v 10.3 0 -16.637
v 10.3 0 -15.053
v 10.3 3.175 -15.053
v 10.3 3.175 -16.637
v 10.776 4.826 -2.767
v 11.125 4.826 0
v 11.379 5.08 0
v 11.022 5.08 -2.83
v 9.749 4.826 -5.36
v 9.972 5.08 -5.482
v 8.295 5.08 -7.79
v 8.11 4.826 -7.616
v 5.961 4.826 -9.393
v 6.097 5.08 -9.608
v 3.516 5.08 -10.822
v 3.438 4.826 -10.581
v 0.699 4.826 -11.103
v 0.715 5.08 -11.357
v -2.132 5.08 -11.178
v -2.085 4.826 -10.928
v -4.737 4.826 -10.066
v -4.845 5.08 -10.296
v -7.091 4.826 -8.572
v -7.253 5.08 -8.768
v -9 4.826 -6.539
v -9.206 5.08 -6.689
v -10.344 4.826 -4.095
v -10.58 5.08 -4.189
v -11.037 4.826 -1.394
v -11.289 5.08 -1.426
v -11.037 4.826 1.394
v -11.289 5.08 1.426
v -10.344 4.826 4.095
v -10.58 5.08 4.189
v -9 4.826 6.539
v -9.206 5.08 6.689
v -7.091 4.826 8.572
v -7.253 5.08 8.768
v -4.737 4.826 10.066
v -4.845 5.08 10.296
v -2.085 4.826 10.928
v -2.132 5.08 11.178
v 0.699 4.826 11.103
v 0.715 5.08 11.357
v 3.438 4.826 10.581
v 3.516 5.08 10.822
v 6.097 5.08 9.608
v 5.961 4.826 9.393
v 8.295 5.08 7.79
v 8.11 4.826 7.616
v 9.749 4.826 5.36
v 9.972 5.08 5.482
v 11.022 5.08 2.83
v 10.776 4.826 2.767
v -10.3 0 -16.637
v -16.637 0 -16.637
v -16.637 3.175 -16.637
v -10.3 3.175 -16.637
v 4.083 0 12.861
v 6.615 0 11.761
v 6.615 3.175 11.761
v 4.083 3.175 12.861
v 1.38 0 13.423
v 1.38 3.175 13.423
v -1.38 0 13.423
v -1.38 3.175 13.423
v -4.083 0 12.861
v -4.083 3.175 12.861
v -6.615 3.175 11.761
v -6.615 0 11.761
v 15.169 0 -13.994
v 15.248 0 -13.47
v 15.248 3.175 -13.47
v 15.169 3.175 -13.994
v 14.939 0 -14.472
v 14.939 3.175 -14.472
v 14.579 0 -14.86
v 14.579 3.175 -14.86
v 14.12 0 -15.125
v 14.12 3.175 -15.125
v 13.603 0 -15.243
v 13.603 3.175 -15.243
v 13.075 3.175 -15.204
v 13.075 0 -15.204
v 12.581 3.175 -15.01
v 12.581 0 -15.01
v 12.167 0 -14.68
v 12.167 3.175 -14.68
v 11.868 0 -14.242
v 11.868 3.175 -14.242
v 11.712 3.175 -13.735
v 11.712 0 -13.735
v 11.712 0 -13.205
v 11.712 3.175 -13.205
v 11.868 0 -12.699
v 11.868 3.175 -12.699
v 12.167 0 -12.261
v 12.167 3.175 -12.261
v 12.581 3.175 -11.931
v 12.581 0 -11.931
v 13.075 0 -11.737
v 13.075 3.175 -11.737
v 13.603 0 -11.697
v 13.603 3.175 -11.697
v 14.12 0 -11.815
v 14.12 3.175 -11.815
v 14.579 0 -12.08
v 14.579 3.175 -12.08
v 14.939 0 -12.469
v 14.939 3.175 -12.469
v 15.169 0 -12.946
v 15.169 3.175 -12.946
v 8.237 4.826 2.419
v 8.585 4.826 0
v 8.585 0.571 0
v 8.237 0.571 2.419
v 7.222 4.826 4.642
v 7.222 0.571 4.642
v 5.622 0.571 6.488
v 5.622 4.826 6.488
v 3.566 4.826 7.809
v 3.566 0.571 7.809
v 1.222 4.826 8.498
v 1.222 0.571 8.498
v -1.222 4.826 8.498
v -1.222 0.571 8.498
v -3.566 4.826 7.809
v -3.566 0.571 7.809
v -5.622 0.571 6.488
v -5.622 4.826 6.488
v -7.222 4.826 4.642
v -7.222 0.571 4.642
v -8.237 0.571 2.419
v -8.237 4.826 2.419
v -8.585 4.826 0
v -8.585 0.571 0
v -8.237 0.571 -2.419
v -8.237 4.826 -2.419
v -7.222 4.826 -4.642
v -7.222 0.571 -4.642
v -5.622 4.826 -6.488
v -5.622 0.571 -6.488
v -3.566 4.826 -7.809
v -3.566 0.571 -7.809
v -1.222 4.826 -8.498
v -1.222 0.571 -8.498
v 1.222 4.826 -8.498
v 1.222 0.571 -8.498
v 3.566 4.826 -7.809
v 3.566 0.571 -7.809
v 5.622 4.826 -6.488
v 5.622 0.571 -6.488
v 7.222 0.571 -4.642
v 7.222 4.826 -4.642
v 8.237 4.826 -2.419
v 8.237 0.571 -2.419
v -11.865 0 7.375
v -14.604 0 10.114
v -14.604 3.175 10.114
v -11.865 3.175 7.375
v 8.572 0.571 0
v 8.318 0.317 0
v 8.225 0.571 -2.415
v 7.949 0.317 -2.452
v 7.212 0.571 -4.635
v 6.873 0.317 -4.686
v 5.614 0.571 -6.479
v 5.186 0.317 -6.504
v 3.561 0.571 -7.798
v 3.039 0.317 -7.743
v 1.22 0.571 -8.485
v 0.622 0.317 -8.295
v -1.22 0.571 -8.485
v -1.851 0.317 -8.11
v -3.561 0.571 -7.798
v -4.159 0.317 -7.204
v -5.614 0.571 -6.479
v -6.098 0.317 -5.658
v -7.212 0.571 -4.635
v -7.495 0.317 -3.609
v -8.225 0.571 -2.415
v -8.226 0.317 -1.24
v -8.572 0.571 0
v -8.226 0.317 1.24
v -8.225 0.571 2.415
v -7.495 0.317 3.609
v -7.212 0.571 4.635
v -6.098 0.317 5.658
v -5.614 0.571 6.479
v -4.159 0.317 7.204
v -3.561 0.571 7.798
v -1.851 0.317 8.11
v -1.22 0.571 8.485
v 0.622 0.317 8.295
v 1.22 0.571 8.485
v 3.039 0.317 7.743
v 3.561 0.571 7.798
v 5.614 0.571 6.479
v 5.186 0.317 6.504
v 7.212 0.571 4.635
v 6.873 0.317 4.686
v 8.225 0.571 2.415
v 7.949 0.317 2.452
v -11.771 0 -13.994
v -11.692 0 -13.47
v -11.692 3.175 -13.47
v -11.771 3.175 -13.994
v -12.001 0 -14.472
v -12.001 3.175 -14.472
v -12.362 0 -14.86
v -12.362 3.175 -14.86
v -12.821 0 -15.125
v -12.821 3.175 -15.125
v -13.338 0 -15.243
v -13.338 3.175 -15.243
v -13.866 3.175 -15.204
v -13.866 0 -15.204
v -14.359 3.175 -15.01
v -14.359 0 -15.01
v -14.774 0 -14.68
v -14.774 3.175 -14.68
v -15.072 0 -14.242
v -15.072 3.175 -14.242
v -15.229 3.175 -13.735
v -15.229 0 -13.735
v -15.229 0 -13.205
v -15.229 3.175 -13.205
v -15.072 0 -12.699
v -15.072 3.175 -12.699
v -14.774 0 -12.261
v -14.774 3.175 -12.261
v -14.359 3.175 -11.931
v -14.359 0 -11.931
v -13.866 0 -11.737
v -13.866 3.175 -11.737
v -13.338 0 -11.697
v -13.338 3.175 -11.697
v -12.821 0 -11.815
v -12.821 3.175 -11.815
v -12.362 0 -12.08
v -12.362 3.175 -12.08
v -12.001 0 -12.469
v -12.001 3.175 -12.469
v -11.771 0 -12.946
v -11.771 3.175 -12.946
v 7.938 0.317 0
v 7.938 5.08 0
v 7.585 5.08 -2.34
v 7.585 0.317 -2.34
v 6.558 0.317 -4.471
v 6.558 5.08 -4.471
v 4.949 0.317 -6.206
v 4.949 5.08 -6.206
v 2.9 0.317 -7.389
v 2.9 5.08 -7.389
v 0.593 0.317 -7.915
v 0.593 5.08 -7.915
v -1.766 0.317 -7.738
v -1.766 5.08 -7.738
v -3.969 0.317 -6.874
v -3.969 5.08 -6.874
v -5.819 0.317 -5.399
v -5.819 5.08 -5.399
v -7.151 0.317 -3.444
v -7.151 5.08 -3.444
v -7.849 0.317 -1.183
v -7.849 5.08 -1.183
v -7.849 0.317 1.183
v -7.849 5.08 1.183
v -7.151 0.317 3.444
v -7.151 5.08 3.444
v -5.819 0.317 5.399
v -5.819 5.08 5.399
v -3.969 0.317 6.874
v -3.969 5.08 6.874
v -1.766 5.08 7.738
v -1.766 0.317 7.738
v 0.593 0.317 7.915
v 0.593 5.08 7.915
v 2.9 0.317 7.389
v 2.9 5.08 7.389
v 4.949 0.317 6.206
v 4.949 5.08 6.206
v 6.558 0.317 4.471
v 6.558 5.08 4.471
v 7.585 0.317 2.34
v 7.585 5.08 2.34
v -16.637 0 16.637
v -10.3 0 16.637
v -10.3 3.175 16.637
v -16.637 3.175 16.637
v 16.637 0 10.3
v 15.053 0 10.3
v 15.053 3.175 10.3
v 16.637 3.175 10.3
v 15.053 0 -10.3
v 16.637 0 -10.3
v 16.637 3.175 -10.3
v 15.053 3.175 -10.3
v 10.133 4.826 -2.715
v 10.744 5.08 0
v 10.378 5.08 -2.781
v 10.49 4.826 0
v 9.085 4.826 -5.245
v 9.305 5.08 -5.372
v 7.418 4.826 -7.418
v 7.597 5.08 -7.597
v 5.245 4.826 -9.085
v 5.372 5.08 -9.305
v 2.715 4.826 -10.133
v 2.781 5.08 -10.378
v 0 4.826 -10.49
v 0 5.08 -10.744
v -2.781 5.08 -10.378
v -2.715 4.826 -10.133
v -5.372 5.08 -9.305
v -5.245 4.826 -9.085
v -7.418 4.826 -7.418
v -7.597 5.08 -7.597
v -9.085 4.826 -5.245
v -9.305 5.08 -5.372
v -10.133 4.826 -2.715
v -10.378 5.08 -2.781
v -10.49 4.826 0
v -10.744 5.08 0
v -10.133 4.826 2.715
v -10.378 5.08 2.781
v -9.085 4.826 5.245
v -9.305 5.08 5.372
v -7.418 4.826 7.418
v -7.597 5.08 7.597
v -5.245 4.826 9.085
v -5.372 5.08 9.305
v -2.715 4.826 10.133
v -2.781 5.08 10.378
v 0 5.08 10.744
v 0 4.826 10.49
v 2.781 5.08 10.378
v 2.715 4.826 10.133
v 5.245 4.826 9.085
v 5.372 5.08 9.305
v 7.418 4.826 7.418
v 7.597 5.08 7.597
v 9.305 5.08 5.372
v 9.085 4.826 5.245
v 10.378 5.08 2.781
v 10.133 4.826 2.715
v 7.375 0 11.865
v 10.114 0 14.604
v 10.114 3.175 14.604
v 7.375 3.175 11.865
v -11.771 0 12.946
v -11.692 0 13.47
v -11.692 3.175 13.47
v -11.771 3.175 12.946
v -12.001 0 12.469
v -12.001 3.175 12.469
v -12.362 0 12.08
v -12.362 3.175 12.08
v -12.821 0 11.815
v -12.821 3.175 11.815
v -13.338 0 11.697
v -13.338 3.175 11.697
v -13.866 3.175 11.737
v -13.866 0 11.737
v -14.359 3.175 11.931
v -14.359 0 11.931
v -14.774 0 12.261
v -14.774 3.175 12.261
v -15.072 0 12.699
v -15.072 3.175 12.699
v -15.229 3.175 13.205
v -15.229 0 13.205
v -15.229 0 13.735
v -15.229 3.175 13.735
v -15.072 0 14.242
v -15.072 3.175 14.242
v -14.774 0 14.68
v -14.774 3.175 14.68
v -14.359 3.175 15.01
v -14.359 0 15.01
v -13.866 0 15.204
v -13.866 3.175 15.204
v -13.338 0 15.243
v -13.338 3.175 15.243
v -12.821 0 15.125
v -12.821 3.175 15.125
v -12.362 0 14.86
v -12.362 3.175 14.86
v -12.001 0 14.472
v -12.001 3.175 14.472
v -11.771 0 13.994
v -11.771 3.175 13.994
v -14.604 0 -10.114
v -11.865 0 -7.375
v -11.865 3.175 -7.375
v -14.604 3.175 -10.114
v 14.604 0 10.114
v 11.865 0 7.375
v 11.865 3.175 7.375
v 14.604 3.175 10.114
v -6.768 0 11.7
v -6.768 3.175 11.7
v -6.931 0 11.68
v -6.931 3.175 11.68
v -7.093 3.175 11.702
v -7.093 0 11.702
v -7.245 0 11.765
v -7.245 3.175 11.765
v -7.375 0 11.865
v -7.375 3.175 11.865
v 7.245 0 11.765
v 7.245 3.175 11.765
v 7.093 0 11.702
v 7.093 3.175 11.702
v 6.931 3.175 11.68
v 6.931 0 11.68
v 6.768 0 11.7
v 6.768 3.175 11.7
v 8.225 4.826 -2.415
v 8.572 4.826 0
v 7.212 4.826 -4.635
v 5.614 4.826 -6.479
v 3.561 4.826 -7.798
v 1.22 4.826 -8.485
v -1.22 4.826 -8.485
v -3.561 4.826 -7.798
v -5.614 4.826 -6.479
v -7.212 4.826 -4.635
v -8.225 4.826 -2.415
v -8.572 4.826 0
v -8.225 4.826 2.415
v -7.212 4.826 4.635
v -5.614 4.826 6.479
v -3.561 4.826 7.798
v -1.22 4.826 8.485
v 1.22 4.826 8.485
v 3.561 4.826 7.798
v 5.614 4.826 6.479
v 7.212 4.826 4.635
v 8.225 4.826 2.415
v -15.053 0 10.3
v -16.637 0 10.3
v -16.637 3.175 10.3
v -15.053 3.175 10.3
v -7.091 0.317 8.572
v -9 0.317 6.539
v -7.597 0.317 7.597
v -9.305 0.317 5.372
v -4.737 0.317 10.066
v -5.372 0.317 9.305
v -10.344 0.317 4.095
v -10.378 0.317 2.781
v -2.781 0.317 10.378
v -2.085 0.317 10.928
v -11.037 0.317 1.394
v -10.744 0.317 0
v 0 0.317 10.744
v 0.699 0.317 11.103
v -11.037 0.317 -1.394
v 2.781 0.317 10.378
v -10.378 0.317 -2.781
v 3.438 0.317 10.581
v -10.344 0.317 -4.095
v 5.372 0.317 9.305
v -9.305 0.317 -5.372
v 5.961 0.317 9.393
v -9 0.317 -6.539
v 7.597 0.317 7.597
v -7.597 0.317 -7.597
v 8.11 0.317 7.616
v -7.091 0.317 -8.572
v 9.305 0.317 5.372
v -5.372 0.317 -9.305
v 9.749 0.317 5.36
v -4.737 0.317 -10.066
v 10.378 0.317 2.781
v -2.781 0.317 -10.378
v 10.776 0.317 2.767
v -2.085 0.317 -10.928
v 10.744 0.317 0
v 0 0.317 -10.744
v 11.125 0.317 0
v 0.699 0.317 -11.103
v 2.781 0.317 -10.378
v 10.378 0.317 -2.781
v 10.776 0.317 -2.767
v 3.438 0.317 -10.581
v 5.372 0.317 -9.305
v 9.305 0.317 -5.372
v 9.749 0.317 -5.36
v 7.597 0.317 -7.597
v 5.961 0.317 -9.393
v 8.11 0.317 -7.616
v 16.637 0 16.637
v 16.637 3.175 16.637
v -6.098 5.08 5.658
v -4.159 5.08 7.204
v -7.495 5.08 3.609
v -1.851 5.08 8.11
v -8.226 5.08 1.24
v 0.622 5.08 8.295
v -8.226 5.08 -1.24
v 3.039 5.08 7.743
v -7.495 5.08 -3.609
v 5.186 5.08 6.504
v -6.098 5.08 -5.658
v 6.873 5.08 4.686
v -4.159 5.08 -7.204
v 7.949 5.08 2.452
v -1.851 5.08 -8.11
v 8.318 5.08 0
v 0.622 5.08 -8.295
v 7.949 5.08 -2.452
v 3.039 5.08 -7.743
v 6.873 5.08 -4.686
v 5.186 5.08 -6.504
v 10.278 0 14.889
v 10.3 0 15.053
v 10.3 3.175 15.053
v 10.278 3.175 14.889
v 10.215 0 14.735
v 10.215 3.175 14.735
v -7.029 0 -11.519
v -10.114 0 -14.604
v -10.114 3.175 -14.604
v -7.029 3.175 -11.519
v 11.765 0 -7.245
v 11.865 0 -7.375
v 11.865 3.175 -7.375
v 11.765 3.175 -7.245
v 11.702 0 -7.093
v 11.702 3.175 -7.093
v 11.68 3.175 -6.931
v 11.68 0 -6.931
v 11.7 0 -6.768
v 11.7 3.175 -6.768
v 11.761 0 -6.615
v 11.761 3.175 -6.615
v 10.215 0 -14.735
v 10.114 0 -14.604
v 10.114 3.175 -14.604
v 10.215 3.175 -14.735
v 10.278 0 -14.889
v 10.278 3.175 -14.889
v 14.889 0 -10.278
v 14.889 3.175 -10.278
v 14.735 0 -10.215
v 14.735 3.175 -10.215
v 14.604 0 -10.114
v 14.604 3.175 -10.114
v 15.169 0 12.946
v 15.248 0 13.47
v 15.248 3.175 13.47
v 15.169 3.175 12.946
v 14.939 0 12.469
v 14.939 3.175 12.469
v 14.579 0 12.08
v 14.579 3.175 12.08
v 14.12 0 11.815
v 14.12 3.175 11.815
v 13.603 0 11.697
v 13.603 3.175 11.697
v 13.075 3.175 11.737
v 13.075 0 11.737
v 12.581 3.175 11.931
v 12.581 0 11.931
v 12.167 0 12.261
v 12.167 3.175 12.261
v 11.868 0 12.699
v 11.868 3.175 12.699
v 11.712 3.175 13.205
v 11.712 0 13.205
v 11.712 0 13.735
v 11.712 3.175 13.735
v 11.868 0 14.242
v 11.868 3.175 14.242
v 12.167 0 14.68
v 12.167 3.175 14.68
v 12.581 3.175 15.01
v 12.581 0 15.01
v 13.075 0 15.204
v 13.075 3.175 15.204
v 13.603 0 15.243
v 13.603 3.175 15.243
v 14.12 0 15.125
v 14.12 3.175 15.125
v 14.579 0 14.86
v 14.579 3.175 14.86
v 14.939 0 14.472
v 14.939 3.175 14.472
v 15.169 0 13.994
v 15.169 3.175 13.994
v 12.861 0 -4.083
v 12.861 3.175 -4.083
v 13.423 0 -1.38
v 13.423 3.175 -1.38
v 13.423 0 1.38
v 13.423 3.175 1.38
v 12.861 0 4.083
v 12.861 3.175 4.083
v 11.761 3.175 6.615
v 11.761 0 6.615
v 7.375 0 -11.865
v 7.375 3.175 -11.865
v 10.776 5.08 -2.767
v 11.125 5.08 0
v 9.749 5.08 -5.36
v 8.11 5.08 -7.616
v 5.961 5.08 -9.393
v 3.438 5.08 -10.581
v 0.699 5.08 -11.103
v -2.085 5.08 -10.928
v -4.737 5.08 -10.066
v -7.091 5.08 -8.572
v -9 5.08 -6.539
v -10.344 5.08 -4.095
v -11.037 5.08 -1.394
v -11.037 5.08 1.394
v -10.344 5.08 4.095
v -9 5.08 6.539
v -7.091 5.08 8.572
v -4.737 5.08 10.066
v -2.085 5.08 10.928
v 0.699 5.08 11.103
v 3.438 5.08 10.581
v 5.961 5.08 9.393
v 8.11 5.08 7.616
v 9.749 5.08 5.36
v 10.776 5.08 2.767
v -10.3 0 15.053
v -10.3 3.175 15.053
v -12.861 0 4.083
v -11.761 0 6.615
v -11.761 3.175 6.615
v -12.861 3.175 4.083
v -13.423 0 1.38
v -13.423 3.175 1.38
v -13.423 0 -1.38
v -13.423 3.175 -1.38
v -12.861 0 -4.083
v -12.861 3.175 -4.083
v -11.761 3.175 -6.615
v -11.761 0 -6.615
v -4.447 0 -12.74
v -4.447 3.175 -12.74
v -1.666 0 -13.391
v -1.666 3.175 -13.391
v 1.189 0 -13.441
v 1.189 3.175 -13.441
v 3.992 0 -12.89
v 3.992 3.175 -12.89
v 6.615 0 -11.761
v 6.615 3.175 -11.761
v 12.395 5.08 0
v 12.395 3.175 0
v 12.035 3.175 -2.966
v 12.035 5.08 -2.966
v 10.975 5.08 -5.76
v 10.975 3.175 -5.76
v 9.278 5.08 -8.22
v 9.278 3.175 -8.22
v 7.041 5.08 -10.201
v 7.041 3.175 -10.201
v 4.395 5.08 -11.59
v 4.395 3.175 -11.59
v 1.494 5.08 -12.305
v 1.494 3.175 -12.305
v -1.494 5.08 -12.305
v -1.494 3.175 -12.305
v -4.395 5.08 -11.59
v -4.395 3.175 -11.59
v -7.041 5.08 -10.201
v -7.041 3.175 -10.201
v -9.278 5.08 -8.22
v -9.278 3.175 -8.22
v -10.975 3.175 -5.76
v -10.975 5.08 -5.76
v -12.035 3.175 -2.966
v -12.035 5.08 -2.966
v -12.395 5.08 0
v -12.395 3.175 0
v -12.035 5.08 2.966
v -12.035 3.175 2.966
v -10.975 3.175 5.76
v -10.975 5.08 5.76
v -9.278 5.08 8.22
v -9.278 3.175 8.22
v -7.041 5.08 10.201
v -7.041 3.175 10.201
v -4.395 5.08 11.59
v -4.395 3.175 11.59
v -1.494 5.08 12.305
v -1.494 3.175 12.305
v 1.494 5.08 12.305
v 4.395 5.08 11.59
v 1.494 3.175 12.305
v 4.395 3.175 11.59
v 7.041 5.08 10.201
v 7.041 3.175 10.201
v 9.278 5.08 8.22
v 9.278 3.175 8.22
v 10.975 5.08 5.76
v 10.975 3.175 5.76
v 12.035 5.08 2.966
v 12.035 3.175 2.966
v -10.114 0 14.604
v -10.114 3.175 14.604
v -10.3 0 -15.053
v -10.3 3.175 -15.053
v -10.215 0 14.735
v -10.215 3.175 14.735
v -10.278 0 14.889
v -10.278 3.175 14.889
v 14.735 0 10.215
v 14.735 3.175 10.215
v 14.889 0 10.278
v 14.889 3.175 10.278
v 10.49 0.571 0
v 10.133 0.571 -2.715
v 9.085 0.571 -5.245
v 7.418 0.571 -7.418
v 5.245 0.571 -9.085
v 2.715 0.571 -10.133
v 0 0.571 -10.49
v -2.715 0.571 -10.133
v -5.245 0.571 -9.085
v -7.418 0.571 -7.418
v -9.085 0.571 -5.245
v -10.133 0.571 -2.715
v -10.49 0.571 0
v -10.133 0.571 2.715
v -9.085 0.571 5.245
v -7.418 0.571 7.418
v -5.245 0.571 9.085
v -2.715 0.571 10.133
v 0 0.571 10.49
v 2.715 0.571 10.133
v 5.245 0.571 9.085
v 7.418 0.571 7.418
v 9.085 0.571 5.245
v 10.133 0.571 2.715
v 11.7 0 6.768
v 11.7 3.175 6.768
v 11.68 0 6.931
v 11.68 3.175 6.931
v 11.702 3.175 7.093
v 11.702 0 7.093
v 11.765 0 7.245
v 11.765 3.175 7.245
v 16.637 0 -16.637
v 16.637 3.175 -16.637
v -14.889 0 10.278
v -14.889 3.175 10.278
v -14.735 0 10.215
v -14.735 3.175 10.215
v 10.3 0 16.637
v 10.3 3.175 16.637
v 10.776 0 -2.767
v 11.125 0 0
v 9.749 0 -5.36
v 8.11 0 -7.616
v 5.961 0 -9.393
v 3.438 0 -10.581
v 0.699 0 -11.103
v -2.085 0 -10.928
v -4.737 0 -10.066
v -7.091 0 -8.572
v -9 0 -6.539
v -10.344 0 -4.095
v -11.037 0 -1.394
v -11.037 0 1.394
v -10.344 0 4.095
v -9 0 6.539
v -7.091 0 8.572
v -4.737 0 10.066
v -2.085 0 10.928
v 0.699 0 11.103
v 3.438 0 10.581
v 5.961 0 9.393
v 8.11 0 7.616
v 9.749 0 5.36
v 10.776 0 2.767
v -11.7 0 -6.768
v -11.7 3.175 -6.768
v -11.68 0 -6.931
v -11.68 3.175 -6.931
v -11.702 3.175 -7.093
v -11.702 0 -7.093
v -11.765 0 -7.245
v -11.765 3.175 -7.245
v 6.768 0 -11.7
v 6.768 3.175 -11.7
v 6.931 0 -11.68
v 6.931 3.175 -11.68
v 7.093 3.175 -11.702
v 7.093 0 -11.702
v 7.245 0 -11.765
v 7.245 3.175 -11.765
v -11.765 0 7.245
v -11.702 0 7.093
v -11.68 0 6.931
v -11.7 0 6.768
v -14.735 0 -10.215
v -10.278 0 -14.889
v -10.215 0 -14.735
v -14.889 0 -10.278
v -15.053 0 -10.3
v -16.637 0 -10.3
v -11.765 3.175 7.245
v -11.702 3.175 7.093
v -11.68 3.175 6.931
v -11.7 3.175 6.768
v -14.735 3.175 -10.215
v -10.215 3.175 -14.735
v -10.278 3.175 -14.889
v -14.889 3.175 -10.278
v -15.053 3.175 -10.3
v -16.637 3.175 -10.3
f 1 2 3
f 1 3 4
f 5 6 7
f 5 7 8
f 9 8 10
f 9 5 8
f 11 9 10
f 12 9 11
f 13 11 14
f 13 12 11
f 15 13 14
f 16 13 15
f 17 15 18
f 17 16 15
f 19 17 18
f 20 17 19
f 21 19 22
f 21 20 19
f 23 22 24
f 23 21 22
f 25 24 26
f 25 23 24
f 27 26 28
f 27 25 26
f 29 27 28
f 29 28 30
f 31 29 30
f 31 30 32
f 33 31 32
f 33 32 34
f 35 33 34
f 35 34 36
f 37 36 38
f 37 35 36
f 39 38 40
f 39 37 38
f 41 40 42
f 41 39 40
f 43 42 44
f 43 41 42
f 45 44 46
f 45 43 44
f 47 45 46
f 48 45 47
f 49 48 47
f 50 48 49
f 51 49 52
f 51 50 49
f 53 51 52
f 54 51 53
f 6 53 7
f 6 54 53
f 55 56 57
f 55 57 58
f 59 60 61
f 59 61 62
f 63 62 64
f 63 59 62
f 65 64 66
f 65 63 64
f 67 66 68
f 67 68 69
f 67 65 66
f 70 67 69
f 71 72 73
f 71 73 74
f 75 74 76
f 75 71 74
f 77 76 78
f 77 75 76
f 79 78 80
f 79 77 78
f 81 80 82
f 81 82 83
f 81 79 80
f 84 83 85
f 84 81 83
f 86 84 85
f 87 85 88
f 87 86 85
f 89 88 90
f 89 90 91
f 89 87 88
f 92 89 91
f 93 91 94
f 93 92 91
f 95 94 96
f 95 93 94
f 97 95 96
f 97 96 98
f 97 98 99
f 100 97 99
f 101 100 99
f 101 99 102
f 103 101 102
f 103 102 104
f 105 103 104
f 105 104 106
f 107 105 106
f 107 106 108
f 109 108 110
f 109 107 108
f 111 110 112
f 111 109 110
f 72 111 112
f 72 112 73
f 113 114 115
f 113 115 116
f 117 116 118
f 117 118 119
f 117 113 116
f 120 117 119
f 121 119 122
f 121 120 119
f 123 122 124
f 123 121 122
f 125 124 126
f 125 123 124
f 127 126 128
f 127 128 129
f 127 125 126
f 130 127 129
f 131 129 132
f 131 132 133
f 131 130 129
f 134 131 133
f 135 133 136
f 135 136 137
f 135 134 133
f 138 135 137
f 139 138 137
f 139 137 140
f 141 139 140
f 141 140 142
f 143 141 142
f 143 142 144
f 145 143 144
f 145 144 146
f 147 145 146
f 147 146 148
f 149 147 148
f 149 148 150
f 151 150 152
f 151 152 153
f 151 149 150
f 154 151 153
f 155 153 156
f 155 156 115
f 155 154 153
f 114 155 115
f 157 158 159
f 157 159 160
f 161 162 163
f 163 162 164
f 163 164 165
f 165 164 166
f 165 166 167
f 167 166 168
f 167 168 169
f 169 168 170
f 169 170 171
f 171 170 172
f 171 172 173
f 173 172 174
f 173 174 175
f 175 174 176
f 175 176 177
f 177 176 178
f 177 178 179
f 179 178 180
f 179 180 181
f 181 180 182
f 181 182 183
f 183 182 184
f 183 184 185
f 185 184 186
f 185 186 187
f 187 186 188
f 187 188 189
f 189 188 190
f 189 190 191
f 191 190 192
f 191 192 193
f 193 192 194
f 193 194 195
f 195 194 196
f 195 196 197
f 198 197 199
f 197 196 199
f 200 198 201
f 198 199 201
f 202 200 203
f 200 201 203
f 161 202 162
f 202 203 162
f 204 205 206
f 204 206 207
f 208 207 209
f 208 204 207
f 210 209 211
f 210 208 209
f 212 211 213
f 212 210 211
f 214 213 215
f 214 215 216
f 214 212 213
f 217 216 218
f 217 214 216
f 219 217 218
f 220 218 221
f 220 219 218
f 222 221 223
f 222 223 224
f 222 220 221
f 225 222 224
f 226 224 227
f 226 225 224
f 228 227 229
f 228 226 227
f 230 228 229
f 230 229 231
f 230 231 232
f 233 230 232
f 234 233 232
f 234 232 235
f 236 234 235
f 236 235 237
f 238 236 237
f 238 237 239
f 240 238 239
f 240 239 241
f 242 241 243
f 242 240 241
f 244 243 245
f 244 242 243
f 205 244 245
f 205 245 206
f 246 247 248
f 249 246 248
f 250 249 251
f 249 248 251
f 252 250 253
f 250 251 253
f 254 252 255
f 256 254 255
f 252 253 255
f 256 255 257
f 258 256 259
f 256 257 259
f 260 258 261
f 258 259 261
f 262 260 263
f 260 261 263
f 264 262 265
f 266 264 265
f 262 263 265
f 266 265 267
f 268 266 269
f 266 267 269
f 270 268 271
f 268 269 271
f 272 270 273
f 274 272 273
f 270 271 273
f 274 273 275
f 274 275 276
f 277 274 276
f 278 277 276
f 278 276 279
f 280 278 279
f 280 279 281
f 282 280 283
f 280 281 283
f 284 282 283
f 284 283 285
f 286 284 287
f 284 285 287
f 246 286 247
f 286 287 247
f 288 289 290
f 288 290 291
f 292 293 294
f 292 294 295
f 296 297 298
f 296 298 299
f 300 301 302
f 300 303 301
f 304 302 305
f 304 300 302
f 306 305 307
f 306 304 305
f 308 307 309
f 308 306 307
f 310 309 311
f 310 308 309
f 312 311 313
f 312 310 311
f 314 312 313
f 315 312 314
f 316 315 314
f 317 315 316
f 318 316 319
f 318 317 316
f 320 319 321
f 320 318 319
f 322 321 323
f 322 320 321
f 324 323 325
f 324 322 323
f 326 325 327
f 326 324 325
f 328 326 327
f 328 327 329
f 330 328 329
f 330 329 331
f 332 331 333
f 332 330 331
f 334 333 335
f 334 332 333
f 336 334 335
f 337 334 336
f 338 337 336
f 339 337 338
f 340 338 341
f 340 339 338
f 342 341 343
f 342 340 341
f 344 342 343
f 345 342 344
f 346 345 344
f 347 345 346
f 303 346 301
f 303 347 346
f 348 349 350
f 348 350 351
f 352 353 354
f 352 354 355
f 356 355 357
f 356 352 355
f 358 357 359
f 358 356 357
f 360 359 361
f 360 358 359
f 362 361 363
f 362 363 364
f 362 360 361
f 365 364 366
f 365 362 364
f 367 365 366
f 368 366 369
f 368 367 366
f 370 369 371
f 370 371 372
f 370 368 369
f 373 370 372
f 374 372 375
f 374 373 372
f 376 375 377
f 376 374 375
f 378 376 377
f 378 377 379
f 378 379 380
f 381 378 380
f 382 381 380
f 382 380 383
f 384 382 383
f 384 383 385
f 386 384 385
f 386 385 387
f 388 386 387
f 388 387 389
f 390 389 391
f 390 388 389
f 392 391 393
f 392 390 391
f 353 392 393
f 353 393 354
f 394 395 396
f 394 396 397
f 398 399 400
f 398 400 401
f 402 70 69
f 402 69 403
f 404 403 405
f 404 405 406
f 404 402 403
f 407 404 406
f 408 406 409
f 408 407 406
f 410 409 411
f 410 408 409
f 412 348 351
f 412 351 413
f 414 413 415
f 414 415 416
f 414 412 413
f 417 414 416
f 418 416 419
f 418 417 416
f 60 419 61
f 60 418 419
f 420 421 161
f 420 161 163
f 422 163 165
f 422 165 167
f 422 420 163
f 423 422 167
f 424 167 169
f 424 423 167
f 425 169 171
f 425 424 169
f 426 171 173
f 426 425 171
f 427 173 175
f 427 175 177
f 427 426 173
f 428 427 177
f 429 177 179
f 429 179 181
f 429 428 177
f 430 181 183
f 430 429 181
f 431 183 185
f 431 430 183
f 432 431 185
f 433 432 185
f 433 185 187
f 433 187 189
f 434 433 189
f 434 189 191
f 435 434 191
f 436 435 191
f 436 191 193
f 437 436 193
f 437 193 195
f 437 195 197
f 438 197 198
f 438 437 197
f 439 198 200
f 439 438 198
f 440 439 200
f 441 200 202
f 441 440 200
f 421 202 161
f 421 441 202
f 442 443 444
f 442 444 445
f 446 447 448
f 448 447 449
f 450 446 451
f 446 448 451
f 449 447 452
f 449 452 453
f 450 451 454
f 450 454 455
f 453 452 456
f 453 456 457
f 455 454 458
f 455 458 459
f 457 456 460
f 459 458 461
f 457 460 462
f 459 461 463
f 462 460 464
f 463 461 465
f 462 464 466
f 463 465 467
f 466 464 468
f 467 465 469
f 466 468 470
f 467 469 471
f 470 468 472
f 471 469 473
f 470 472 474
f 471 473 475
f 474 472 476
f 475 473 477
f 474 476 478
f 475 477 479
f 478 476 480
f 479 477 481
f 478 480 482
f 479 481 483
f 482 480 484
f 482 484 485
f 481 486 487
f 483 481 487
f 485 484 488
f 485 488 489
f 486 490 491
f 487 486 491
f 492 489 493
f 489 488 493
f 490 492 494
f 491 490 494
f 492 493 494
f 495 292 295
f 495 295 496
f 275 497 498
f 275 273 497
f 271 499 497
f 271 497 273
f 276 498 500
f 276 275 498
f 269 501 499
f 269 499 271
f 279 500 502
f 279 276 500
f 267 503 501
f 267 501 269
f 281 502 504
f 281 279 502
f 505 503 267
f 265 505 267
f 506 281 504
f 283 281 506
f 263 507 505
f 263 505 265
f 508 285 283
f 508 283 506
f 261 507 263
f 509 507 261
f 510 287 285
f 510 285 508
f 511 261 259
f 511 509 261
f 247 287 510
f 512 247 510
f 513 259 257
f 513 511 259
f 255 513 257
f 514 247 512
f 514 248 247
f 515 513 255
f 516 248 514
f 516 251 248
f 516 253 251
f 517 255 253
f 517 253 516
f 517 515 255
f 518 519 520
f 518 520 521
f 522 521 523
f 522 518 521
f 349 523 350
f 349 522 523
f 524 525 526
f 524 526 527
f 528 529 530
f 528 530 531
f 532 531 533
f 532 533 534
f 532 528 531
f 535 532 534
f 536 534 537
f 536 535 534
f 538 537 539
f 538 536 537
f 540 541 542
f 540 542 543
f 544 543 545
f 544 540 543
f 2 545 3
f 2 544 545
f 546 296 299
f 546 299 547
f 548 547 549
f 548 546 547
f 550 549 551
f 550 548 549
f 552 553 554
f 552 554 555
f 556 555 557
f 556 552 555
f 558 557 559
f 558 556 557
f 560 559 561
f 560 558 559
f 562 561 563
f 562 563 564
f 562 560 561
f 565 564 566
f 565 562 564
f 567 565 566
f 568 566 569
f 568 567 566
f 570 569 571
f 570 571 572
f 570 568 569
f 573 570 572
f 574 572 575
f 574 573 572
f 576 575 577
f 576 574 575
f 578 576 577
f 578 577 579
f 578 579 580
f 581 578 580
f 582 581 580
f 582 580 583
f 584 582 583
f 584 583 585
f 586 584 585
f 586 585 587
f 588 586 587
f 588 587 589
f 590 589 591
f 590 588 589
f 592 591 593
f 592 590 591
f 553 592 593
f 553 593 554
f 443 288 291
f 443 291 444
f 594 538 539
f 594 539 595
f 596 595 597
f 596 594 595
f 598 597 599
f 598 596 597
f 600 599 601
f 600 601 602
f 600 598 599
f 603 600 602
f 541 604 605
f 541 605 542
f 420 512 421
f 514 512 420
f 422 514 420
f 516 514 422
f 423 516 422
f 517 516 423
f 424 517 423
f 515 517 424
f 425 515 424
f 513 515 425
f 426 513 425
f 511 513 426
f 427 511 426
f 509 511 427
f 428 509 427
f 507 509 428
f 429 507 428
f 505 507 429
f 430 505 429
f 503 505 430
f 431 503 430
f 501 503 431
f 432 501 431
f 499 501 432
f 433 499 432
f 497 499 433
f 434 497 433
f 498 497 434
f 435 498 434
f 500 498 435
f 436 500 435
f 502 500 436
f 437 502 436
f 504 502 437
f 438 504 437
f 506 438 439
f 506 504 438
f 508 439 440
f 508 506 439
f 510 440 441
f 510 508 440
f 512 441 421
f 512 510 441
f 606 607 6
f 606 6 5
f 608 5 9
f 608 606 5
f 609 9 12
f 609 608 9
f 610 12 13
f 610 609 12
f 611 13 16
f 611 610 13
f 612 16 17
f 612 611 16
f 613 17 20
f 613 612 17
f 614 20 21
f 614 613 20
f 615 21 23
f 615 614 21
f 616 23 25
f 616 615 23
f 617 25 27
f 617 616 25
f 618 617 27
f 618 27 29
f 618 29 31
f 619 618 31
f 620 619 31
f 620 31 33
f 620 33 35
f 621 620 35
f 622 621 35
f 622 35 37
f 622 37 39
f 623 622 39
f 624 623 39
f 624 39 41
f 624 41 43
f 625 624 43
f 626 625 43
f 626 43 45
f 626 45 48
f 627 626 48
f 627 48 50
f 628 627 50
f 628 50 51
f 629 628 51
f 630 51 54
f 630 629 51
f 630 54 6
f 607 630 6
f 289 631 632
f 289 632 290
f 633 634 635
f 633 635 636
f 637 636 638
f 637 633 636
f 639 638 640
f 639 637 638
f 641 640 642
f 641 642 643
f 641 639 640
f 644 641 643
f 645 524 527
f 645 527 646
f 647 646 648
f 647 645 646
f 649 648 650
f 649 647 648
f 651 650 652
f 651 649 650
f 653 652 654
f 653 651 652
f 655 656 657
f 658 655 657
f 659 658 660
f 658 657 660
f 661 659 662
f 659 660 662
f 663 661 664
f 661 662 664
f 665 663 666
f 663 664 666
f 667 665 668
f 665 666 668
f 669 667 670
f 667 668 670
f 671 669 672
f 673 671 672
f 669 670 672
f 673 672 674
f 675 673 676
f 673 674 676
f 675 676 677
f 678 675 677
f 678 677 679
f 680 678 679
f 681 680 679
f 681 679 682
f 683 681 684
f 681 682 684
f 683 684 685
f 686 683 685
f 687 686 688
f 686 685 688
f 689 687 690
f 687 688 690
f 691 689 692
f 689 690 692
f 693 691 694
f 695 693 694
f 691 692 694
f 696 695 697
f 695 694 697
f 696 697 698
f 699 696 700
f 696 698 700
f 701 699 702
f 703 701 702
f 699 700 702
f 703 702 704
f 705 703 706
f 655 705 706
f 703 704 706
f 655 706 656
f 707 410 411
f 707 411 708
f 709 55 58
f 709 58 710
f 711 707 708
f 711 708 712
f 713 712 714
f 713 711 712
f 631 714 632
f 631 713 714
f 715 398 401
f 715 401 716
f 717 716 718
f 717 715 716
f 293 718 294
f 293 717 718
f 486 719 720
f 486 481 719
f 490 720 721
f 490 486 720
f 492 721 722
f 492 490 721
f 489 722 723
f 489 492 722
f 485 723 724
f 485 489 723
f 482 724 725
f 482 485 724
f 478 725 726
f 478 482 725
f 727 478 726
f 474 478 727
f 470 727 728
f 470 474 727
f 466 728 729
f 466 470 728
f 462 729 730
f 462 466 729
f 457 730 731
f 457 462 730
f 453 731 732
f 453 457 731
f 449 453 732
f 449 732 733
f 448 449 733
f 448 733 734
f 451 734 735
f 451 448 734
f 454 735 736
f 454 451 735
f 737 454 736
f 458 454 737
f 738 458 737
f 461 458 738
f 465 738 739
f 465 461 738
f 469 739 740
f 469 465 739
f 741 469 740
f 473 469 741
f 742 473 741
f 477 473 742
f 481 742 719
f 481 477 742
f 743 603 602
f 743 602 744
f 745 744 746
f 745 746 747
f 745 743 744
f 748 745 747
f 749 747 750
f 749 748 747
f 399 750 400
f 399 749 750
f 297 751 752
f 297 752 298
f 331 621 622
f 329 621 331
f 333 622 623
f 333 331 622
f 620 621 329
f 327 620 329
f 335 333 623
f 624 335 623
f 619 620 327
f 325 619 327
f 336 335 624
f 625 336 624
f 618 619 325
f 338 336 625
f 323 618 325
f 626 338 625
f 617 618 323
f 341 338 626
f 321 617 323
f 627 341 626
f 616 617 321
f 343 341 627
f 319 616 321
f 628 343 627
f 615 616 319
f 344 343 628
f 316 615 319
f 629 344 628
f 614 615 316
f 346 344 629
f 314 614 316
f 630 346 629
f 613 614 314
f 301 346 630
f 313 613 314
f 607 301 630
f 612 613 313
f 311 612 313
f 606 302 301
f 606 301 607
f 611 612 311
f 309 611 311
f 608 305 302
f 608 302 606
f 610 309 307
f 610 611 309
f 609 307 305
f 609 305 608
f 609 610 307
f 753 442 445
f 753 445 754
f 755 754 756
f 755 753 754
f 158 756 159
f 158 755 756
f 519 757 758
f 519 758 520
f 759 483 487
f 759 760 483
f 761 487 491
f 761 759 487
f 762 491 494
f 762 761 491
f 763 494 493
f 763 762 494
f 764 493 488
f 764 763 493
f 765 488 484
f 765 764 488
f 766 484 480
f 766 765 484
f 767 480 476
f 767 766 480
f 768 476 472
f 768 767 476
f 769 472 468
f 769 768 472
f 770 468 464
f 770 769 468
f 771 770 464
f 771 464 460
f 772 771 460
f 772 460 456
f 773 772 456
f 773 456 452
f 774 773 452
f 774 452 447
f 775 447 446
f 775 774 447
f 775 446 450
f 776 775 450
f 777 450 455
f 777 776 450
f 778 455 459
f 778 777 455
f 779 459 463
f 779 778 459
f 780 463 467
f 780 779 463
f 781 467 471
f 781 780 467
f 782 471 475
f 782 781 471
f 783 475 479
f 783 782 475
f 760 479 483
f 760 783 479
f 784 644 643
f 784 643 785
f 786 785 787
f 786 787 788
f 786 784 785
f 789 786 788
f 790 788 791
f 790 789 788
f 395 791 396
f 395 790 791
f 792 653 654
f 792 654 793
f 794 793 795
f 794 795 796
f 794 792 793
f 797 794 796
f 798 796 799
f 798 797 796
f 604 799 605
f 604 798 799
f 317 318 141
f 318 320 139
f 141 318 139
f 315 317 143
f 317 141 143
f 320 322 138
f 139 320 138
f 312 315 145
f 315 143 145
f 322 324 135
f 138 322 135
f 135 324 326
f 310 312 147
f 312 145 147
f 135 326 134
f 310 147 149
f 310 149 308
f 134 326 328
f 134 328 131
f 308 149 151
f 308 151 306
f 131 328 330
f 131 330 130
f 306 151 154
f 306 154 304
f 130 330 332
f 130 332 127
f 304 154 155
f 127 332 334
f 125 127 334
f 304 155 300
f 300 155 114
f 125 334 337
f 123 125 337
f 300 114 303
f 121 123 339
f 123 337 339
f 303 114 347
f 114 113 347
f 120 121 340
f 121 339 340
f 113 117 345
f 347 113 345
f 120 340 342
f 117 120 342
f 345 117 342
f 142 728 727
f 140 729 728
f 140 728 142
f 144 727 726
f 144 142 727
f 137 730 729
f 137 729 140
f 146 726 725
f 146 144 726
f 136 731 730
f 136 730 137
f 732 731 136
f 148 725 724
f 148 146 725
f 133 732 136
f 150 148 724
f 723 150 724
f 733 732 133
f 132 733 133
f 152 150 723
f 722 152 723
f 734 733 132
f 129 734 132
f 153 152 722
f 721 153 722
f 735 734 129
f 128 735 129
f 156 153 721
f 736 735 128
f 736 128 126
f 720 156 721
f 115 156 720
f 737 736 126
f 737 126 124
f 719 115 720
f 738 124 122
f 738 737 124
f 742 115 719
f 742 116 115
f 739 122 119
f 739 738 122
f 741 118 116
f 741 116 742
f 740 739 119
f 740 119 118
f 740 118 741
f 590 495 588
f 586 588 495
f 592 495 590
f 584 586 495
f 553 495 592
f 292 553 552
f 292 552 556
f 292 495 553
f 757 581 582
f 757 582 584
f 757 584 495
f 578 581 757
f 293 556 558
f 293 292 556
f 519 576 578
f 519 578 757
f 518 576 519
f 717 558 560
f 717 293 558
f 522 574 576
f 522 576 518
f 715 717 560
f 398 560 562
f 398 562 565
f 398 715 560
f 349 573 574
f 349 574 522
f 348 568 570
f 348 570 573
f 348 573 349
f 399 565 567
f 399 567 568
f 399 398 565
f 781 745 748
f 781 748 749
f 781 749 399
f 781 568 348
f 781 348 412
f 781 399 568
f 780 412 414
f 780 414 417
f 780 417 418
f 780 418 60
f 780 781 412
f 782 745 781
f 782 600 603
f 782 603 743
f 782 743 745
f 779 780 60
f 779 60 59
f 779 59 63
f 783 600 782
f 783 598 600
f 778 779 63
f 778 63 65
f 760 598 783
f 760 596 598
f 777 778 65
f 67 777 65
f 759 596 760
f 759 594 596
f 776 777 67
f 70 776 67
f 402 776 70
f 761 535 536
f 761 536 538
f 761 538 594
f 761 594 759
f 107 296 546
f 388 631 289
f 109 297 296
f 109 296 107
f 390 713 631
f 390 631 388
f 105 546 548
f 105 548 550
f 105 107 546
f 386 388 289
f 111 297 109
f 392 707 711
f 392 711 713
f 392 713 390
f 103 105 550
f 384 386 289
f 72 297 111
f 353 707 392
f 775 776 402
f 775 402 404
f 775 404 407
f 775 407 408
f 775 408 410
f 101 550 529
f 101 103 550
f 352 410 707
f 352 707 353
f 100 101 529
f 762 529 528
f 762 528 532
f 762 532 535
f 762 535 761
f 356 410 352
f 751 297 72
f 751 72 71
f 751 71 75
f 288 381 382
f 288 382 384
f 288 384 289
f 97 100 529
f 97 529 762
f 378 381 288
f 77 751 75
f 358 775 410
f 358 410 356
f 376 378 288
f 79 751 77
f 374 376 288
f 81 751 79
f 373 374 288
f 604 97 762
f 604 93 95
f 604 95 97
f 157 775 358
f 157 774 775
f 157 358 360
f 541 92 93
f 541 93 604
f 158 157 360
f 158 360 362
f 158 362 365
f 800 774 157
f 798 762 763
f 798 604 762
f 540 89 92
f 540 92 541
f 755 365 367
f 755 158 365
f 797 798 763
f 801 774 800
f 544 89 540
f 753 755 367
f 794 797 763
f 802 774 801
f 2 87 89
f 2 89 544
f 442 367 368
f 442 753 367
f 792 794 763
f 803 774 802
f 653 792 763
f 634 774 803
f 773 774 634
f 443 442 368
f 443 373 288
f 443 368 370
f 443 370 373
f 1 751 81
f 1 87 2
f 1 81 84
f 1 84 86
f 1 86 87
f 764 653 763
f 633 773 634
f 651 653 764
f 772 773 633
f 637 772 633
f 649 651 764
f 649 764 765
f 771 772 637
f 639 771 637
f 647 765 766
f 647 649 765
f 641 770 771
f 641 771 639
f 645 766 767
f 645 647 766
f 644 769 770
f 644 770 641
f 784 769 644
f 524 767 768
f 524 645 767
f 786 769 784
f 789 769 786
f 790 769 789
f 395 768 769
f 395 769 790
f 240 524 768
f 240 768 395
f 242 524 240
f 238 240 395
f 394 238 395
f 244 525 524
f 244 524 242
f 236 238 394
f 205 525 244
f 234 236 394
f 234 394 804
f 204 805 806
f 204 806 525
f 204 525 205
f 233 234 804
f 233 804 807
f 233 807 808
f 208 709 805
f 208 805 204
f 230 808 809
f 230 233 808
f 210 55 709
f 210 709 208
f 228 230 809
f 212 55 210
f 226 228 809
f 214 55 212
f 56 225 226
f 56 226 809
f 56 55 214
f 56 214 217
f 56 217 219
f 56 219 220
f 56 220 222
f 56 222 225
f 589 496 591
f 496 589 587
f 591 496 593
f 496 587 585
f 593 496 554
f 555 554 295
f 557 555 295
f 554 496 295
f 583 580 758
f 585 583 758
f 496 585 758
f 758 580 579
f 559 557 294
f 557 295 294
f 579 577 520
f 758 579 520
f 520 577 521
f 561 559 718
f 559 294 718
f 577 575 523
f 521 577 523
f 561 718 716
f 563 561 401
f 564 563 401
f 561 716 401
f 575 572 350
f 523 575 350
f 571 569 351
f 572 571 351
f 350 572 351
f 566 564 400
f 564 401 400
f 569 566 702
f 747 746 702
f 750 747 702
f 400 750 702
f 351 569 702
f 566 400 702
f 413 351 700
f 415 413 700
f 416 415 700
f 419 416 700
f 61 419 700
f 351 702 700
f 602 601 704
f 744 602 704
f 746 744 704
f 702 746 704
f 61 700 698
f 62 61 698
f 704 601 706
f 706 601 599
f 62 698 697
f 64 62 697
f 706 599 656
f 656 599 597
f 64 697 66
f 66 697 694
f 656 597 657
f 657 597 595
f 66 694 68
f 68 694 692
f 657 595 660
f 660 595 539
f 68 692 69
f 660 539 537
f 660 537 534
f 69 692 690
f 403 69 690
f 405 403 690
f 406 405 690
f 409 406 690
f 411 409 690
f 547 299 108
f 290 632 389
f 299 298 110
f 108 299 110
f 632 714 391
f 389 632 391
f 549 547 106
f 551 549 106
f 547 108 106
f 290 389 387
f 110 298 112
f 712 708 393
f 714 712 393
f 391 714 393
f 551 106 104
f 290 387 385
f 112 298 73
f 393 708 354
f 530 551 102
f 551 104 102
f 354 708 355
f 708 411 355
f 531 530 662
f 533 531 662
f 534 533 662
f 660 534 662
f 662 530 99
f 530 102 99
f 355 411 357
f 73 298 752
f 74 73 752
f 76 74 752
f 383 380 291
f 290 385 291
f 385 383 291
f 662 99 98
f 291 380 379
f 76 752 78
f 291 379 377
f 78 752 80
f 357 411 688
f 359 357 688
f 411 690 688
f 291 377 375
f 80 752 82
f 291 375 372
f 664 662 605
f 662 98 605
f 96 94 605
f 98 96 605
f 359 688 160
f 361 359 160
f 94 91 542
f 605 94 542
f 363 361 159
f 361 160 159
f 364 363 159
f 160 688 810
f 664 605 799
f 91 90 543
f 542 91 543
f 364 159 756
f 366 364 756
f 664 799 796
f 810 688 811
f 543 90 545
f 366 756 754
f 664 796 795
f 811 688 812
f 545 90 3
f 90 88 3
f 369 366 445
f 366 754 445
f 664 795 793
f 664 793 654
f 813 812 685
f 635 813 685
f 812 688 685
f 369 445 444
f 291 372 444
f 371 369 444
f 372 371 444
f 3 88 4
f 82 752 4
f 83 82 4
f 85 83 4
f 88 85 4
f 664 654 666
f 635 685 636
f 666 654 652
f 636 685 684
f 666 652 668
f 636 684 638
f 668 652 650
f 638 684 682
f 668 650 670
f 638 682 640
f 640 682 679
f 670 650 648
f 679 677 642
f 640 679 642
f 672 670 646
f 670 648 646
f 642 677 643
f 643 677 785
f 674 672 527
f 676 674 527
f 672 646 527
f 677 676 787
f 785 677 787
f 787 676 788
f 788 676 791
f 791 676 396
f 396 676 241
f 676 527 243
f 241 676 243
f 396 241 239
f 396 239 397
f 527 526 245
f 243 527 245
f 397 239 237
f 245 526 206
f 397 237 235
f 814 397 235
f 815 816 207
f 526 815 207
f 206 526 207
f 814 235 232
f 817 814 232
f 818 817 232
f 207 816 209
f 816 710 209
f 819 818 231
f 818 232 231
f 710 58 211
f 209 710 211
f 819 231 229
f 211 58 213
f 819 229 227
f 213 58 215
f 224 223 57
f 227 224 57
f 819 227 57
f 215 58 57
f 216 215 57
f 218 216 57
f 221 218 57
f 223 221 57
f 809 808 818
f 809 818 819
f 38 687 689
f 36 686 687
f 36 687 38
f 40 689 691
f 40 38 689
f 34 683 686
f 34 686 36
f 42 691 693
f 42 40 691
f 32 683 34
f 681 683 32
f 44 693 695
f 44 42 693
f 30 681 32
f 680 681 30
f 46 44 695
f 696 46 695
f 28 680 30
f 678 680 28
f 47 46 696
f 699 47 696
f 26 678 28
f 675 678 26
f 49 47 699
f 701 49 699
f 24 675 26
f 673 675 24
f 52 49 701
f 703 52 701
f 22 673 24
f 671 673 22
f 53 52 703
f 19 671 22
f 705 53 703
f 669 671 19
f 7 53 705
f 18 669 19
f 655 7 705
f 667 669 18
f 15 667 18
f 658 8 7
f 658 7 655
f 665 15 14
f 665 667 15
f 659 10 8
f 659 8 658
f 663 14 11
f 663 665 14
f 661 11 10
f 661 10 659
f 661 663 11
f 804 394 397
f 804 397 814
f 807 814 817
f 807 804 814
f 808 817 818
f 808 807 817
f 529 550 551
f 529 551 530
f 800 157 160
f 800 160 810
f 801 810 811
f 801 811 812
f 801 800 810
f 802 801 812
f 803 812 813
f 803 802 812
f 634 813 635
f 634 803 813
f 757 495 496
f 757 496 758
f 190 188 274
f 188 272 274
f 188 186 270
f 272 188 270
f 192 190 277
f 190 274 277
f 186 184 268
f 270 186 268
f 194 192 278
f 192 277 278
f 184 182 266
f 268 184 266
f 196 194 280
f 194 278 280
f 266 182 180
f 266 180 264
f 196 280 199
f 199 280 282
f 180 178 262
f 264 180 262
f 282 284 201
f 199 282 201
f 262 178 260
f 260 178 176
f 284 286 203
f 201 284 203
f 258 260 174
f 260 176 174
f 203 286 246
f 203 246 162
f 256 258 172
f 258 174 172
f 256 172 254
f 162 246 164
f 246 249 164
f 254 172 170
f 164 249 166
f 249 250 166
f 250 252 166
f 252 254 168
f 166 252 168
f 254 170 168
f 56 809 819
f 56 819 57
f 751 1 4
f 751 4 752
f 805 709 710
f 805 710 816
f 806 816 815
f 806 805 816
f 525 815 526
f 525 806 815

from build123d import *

# Parameters (mm, degrees)
SKETCH1_R           = 11.1252
SKETCH1_R_2         = 1.778
BOSS_EXTRUDE1_DEPTH = 3.175
SKETCH2_R           = 12.3952
SKETCH2_R_2         = 11.1252
BOSS_EXTRUDE2_DEPTH = 1.905
CHAMFER1_SIZE       = 0.254
SKETCH3_R           = 11.1252
SKETCH3_R_2         = 10.4902
BOSS_EXTRUDE3_DEPTH = 4.7625
CHAMFER2_SIZE       = 0.254
SKETCH4_R           = 10.4902
SKETCH4_R_2         = 8.5852
BOSS_EXTRUDE4_DEPTH = 4.2545
SKETCH5_R           = 8.5725
SKETCH5_R_2         = 7.9375
BOSS_EXTRUDE5_DEPTH = 4.7625
CHAMFER3_SIZE       = 0.254


with BuildPart() as part:
    # Sketch1 → Boss-Extrude1 (new body)
    with BuildSketch(Plane(origin=(0, 0, 0), x_dir=(1, 0, 0), z_dir=(0, 1, 0))):
        with BuildLine():
            Line((-10.2997, 16.637), (-10.2997, 15.052853673))
            ThreePointArc((-10.2997, 15.052853673), (-10.251363503, 14.809849693), (-10.113712806, 14.603840867))
            Line((-10.113712806, 14.603840867), (-7.028572367, 11.518700428))
            ThreePointArc((-7.028572367, 11.518700428), (-0.239648526, 13.491621757), (6.615059614, 11.761049076))
            ThreePointArc((6.615059614, 11.761049076), (7.012778636, 11.685418625), (7.375369343, 11.865497403))
            Line((7.375369343, 11.865497403), (10.113712806, 14.603840867))
            ThreePointArc((10.113712806, 14.603840867), (10.251363503, 14.809849693), (10.2997, 15.052853673))
            Line((10.2997, 15.052853673), (10.2997, 16.637))
            Line((10.2997, 16.637), (16.637, 16.637))
            Line((16.637, 16.637), (16.637, 10.2997))
            Line((16.637, 10.2997), (15.052853673, 10.2997))
            ThreePointArc((15.052853673, 10.2997), (14.809849693, 10.251363503), (14.603840867, 10.113712806))
            Line((14.603840867, 10.113712806), (11.865497403, 7.375369343))
            ThreePointArc((11.865497403, 7.375369343), (11.685418625, 7.012778636), (11.761049076, 6.615059614))
            ThreePointArc((11.761049076, 6.615059614), (13.49375, 0), (11.761049076, -6.615059614))
            ThreePointArc((11.761049076, -6.615059614), (11.685418625, -7.012778636), (11.865497403, -7.375369343))
            Line((11.865497403, -7.375369343), (14.603840867, -10.113712806))
            ThreePointArc((14.603840867, -10.113712806), (14.809849693, -10.251363503), (15.052853673, -10.2997))
            Line((15.052853673, -10.2997), (16.637, -10.2997))
            Line((16.637, -10.2997), (16.637, -16.637))
            Line((16.637, -16.637), (10.2997, -16.637))
            Line((10.2997, -16.637), (10.2997, -15.052853673))
            ThreePointArc((10.2997, -15.052853673), (10.251363503, -14.809849693), (10.113712806, -14.603840867))
            Line((10.113712806, -14.603840867), (7.375369343, -11.865497403))
            ThreePointArc((7.375369343, -11.865497403), (7.012778636, -11.685418625), (6.615059614, -11.761049076))
            ThreePointArc((6.615059614, -11.761049076), (0, -13.49375), (-6.615059614, -11.761049076))
            ThreePointArc((-6.615059614, -11.761049076), (-7.012778636, -11.685418625), (-7.375369343, -11.865497403))
            Line((-7.375369343, -11.865497403), (-10.113712806, -14.603840867))
            ThreePointArc((-10.113712806, -14.603840867), (-10.251363503, -14.809849693), (-10.2997, -15.052853673))
            Line((-10.2997, -15.052853673), (-10.2997, -16.637))
            Line((-10.2997, -16.637), (-16.637, -16.637))
            Line((-16.637, -16.637), (-16.637, -10.2997))
            Line((-16.637, -10.2997), (-15.052853673, -10.2997))
            ThreePointArc((-15.052853673, -10.2997), (-14.809849693, -10.251363503), (-14.603840867, -10.113712806))
            Line((-14.603840867, -10.113712806), (-11.865497403, -7.375369343))
            ThreePointArc((-11.865497403, -7.375369343), (-11.685418625, -7.012778636), (-11.761049076, -6.615059614))
            ThreePointArc((-11.761049076, -6.615059614), (-13.49375, 0), (-11.761049076, 6.615059614))
            ThreePointArc((-11.761049076, 6.615059614), (-11.685418625, 7.012778636), (-11.865497403, 7.375369343))
            Line((-11.865497403, 7.375369343), (-14.603840867, 10.113712806))
            ThreePointArc((-14.603840867, 10.113712806), (-14.809849693, 10.251363503), (-15.052853673, 10.2997))
            Line((-15.052853673, 10.2997), (-16.637, 10.2997))
            Line((-16.637, 10.2997), (-16.637, 16.637))
            Line((-16.637, 16.637), (-10.2997, 16.637))
        make_face()
        Circle(SKETCH1_R, mode=Mode.SUBTRACT)
        with Locations((-13.470384182, -13.470384182)):
            Circle(SKETCH1_R_2, mode=Mode.SUBTRACT)
        with Locations((-13.470384182, 13.470384182)):
            Circle(SKETCH1_R_2, mode=Mode.SUBTRACT)
        with Locations((13.470384182, 13.470384182)):
            Circle(SKETCH1_R_2, mode=Mode.SUBTRACT)
        with Locations((13.470384182, -13.470384182)):
            Circle(SKETCH1_R_2, mode=Mode.SUBTRACT)
    extrude(amount=BOSS_EXTRUDE1_DEPTH)

    # Sketch2 → Boss-Extrude2 (add)
    with BuildSketch(Plane(origin=(0, 3.175, 0), x_dir=(1, 0, 0), z_dir=(0, 1, 0))):
        Circle(SKETCH2_R)
        Circle(SKETCH2_R_2, mode=Mode.SUBTRACT)
    extrude(amount=BOSS_EXTRUDE2_DEPTH)

    # Chamfer1
    chamfer1_edges = [part.edges().sort_by_distance(p)[0] for p in [
        (-11.1252, 5.08, 0),
    ]]
    chamfer(chamfer1_edges, length=CHAMFER1_SIZE)

    # Sketch3 → Boss-Extrude3 (add)
    with BuildSketch(Plane(origin=(0, 5.08, 0), x_dir=(1, 0, 0), z_dir=(0, 1, 0))):
        Circle(SKETCH3_R)
        Circle(SKETCH3_R_2, mode=Mode.SUBTRACT)
    extrude(amount=-BOSS_EXTRUDE3_DEPTH)

    # Chamfer2
    chamfer2_edges = [part.edges().sort_by_distance(p)[0] for p in [
        (-10.4902, 0.3175, 0),
        (-10.4902, 5.08, 0),
    ]]
    chamfer(chamfer2_edges, length=CHAMFER2_SIZE)

    # Sketch4 → Boss-Extrude4 (add)
    with BuildSketch(Plane.XZ.offset(-4.826)):
        Circle(SKETCH4_R)
        Circle(SKETCH4_R_2, mode=Mode.SUBTRACT)
    extrude(amount=BOSS_EXTRUDE4_DEPTH)


with BuildPart() as body_2:
    # Sketch5 → Boss-Extrude5 (new body)
    with BuildSketch(Plane(origin=(0, 5.08, 0), x_dir=(1, 0, 0), z_dir=(0, 1, 0))):
        Circle(SKETCH5_R)
        Circle(SKETCH5_R_2, mode=Mode.SUBTRACT)
    extrude(amount=-BOSS_EXTRUDE5_DEPTH)

    # Chamfer3
    chamfer3_edges = [body_2.edges().sort_by_distance(p)[0] for p in [
        (-8.5725, 5.08, 0),
        (-8.5725, 0.3175, 0),
    ]]
    chamfer(chamfer3_edges, length=CHAMFER3_SIZE)


solid = Compound([part.part, body_2.part])
